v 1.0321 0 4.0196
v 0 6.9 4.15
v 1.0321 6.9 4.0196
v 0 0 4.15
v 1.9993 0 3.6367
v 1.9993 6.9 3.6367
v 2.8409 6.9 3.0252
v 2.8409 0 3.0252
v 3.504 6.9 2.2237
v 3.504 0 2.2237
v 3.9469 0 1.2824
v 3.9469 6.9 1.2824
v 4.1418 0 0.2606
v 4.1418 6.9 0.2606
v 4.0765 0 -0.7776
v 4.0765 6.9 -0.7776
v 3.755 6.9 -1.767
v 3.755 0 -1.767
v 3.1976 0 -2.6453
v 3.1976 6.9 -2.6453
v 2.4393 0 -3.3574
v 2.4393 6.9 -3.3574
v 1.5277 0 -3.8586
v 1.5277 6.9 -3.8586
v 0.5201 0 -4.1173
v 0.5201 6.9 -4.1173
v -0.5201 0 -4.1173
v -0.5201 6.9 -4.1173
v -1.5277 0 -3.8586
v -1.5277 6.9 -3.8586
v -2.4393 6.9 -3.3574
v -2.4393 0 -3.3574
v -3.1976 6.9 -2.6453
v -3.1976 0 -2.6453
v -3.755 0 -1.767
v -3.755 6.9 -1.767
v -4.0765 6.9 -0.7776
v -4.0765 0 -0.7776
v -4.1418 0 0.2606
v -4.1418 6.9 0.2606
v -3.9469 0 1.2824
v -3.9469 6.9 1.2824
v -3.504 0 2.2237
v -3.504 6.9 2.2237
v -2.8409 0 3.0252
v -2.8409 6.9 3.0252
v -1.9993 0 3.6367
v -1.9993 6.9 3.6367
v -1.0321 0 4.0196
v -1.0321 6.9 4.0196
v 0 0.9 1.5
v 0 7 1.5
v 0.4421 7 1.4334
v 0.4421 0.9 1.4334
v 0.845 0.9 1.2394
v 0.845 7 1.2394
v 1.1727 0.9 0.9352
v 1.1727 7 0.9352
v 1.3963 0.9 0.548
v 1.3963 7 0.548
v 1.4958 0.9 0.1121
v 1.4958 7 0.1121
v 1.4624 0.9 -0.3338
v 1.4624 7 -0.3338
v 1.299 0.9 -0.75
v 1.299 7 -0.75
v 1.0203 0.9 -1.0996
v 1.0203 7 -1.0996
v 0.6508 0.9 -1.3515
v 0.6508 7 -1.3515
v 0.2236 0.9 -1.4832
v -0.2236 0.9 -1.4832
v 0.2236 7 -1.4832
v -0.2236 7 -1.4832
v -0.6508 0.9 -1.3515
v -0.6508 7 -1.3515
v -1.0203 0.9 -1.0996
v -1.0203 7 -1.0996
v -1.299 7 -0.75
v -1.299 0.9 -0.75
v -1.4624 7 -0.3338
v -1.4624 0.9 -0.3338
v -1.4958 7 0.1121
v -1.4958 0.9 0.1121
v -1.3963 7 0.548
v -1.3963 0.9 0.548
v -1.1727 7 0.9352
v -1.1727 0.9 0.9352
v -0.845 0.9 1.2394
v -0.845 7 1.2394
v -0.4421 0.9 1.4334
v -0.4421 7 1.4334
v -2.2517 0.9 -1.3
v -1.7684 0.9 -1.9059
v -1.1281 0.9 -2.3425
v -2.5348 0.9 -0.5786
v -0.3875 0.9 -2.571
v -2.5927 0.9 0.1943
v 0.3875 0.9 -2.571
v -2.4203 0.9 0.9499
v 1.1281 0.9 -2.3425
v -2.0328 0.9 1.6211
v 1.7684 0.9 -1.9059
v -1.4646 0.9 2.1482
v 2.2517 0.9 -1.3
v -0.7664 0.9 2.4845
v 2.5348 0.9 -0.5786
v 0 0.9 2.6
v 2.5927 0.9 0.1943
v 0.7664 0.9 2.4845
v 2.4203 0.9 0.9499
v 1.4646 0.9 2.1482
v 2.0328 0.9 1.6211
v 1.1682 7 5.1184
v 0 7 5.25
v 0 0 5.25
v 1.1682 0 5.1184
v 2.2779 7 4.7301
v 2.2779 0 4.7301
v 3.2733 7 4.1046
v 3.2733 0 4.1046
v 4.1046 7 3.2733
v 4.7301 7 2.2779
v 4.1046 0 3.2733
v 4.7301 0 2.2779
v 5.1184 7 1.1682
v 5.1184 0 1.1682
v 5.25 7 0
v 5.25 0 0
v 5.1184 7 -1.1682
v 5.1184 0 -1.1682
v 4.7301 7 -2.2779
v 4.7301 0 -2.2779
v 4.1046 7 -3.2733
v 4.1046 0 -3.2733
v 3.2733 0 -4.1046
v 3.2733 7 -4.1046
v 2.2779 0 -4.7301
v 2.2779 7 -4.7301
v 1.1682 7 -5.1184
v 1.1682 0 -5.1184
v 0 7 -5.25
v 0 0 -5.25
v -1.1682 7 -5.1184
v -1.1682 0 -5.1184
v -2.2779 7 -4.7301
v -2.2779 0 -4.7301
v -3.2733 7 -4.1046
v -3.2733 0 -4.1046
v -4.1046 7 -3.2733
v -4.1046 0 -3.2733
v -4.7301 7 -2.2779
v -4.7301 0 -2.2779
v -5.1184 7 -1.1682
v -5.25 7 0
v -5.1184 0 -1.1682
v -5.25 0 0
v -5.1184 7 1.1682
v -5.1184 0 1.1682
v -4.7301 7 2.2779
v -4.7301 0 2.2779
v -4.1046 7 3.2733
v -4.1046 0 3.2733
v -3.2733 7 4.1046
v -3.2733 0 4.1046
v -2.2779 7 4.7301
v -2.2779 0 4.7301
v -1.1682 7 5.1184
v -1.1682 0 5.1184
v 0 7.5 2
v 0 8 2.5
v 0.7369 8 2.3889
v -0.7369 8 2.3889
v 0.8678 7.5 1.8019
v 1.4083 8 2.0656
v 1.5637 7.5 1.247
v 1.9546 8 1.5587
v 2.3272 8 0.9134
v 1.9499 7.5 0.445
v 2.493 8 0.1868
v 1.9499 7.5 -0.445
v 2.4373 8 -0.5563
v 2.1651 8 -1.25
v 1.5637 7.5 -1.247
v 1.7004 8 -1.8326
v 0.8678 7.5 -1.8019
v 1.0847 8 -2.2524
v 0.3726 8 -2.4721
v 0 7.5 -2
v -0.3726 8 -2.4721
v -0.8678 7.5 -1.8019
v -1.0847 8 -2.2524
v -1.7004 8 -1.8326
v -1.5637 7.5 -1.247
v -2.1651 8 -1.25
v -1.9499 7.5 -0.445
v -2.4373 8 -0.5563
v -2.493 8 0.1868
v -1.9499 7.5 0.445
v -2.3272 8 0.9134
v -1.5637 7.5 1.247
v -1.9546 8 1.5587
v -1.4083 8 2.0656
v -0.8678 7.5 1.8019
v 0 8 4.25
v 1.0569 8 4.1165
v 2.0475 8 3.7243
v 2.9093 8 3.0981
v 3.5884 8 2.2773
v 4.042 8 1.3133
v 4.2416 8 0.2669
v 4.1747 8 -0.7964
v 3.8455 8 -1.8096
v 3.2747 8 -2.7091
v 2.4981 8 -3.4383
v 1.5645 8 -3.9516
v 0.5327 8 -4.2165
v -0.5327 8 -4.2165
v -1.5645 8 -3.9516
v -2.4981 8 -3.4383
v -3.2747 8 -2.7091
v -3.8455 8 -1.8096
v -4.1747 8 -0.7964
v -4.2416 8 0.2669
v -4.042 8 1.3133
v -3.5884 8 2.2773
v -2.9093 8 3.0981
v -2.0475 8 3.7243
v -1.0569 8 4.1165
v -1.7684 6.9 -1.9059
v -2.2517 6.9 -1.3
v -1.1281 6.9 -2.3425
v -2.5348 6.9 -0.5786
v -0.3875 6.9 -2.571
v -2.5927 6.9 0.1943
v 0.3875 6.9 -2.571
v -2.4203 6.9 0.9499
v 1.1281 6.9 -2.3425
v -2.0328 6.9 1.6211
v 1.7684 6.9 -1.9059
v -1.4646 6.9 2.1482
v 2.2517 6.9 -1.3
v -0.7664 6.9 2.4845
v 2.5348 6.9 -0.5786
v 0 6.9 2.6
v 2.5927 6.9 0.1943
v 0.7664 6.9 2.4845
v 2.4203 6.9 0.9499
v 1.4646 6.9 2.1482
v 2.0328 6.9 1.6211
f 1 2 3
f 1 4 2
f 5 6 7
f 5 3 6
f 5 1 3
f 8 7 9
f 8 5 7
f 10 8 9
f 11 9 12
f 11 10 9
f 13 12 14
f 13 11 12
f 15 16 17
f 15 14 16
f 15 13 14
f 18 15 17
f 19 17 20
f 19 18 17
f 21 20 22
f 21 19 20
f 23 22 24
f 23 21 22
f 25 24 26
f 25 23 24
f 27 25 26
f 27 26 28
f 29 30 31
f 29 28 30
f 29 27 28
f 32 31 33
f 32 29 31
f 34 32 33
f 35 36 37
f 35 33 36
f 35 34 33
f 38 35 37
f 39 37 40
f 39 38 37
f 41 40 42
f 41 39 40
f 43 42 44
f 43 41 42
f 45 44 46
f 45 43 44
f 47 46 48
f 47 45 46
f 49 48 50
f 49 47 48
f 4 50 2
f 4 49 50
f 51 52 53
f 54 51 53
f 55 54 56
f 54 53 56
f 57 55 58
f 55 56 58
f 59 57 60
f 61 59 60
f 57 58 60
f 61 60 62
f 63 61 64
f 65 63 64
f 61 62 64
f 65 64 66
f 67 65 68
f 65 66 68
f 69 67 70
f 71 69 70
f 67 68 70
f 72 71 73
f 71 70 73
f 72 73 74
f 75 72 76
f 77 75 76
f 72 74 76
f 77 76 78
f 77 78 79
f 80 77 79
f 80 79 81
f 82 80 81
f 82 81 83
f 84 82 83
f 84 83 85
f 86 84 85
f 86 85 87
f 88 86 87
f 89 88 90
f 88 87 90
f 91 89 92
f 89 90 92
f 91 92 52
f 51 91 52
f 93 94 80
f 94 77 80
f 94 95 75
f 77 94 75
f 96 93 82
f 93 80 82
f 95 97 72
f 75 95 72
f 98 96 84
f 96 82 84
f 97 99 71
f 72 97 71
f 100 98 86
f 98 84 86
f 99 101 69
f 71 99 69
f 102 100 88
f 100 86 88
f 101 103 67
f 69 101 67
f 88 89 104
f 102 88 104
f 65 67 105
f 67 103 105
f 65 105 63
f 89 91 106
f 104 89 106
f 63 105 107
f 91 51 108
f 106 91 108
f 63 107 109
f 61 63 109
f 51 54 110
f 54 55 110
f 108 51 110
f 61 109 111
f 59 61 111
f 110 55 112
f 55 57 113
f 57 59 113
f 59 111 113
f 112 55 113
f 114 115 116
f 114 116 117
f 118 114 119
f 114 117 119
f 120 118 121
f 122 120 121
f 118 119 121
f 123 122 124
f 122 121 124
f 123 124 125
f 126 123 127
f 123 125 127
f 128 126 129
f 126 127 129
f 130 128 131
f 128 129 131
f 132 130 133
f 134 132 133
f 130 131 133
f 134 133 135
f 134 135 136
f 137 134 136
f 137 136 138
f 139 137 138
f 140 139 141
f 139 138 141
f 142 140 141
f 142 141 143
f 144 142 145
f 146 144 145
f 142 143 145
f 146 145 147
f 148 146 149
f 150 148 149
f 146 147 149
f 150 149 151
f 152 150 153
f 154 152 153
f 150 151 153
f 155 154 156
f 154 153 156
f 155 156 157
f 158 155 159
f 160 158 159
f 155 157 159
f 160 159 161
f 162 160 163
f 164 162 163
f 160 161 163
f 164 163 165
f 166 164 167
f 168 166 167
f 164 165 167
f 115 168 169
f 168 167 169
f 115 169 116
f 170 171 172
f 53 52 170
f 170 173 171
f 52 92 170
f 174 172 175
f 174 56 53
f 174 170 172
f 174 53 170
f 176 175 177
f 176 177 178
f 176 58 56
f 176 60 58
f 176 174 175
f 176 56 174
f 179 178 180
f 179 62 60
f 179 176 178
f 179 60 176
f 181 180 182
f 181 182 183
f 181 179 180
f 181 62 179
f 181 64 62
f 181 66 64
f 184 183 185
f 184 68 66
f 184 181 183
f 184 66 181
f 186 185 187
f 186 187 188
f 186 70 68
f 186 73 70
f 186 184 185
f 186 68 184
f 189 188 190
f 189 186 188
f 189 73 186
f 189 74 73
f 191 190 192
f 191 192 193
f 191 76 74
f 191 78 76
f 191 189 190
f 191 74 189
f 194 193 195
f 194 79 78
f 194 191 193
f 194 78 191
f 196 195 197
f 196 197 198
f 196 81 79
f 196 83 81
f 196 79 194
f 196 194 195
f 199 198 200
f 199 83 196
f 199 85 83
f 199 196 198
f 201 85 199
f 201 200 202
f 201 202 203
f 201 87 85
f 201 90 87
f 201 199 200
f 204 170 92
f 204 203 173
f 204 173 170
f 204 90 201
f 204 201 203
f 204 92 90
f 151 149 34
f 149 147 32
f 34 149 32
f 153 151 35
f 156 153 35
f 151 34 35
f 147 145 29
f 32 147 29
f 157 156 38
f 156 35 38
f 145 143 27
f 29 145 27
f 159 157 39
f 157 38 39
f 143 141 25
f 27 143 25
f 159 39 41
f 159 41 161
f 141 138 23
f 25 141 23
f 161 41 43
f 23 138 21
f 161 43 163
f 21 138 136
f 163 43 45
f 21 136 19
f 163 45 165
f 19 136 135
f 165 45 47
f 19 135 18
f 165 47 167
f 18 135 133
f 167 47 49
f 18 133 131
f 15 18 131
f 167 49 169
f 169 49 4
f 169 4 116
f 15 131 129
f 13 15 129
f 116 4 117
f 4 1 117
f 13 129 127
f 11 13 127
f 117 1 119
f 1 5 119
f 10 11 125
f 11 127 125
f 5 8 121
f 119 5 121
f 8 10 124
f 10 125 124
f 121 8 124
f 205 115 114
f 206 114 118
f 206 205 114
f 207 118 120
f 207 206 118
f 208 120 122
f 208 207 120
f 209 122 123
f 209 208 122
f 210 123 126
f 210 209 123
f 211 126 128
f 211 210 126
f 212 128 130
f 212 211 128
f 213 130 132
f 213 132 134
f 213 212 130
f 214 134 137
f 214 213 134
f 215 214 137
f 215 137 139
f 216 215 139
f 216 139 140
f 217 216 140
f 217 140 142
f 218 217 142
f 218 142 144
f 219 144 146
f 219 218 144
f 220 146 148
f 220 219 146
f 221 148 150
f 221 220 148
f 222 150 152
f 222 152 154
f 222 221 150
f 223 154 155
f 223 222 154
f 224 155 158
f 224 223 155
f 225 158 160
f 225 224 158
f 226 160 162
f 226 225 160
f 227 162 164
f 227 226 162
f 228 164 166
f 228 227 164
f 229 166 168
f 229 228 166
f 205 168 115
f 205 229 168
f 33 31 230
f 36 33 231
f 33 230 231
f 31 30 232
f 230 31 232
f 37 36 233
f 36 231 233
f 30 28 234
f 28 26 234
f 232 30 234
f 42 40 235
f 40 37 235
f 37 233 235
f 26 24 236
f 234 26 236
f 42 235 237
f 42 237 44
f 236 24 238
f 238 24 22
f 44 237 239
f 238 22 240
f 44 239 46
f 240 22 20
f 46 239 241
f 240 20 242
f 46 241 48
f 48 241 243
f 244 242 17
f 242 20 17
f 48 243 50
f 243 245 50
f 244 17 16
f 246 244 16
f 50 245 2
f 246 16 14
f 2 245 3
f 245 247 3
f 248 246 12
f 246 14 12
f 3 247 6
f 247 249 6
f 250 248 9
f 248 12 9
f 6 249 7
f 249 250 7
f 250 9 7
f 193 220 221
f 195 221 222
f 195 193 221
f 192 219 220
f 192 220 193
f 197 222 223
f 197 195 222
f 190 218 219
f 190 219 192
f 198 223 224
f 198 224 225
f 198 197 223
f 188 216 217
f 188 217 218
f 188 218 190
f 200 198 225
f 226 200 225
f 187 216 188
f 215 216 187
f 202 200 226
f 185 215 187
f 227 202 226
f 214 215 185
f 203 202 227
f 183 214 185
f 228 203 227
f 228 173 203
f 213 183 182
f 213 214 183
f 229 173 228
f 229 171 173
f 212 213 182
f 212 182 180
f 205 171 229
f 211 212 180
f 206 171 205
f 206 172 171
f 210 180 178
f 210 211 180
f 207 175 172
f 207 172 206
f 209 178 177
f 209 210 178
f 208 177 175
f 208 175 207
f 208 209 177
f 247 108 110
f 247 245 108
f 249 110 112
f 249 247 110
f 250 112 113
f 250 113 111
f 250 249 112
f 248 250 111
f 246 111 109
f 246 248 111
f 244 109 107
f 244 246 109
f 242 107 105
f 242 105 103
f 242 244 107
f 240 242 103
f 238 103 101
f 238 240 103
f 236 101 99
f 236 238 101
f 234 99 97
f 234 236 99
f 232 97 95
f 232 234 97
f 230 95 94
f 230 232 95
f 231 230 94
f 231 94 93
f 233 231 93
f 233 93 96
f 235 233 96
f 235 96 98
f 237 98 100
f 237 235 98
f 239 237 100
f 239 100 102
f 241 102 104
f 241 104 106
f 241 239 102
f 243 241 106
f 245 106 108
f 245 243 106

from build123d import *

# Parameters (mm, degrees)
SKETCH1_R           = 5.25
BOSS_EXTRUDE1_DEPTH = 8
SKETCH2_R           = 1.5
CUT_EXTRUDE1_DEPTH  = 6
SHELL1_T            = -1.1
SKETCH3_R           = 1.5
CUT_EXTRUDE2_DEPTH  = 10.545941546
CHAMFER1_SIZE       = 1
CHAMFER2_SIZE       = 1


with BuildPart() as part:
    # Sketch1 → Boss-Extrude1 (new body)
    with BuildSketch(Plane(origin=(0, 0, 0), x_dir=(1, 0, 0), z_dir=(0, 1, 0))):
        with Locations(Location((0, 0, 0), (0, 0, 270))):
            Circle(SKETCH1_R)
    extrude(amount=BOSS_EXTRUDE1_DEPTH)

    # Sketch2 → Cut-Extrude1 (cut)
    with BuildSketch(Plane(origin=(0, 8, 0), x_dir=(1, 0, 0), z_dir=(0, 1, 0))):
        with Locations(Location((0, 0, 0), (0, 0, 270))):
            Circle(SKETCH2_R)
    extrude(amount=-CUT_EXTRUDE1_DEPTH, mode=Mode.SUBTRACT)

    # Shell1
    shell1_openings = [part.faces().sort_by_distance(p)[0] for p in [
        (0, 0, 0),
    ]]
    offset(amount=SHELL1_T, openings=shell1_openings, kind=Kind.INTERSECTION)

    # Sketch3 → Cut-Extrude2 (cut, through all)
    with BuildSketch(Plane(origin=(0, 2, 0), x_dir=(1, 0, 0), z_dir=(0, 1, 0))):
        with Locations(Location((0, 0, 0), (0, 0, 270))):
            Circle(SKETCH3_R)
    extrude(amount=-CUT_EXTRUDE2_DEPTH, mode=Mode.SUBTRACT)

    # Chamfer1
    chamfer1_edges = [part.edges().sort_by_distance(p)[0] for p in [
        (0, 8, -5.25),
    ]]
    chamfer(chamfer1_edges, length=CHAMFER1_SIZE)

    # Chamfer2
    chamfer2_edges = [part.edges().sort_by_distance(p)[0] for p in [
        (0, 8, -1.5),
    ]]
    chamfer(chamfer2_edges, length=CHAMFER2_SIZE)


solid = part.part
